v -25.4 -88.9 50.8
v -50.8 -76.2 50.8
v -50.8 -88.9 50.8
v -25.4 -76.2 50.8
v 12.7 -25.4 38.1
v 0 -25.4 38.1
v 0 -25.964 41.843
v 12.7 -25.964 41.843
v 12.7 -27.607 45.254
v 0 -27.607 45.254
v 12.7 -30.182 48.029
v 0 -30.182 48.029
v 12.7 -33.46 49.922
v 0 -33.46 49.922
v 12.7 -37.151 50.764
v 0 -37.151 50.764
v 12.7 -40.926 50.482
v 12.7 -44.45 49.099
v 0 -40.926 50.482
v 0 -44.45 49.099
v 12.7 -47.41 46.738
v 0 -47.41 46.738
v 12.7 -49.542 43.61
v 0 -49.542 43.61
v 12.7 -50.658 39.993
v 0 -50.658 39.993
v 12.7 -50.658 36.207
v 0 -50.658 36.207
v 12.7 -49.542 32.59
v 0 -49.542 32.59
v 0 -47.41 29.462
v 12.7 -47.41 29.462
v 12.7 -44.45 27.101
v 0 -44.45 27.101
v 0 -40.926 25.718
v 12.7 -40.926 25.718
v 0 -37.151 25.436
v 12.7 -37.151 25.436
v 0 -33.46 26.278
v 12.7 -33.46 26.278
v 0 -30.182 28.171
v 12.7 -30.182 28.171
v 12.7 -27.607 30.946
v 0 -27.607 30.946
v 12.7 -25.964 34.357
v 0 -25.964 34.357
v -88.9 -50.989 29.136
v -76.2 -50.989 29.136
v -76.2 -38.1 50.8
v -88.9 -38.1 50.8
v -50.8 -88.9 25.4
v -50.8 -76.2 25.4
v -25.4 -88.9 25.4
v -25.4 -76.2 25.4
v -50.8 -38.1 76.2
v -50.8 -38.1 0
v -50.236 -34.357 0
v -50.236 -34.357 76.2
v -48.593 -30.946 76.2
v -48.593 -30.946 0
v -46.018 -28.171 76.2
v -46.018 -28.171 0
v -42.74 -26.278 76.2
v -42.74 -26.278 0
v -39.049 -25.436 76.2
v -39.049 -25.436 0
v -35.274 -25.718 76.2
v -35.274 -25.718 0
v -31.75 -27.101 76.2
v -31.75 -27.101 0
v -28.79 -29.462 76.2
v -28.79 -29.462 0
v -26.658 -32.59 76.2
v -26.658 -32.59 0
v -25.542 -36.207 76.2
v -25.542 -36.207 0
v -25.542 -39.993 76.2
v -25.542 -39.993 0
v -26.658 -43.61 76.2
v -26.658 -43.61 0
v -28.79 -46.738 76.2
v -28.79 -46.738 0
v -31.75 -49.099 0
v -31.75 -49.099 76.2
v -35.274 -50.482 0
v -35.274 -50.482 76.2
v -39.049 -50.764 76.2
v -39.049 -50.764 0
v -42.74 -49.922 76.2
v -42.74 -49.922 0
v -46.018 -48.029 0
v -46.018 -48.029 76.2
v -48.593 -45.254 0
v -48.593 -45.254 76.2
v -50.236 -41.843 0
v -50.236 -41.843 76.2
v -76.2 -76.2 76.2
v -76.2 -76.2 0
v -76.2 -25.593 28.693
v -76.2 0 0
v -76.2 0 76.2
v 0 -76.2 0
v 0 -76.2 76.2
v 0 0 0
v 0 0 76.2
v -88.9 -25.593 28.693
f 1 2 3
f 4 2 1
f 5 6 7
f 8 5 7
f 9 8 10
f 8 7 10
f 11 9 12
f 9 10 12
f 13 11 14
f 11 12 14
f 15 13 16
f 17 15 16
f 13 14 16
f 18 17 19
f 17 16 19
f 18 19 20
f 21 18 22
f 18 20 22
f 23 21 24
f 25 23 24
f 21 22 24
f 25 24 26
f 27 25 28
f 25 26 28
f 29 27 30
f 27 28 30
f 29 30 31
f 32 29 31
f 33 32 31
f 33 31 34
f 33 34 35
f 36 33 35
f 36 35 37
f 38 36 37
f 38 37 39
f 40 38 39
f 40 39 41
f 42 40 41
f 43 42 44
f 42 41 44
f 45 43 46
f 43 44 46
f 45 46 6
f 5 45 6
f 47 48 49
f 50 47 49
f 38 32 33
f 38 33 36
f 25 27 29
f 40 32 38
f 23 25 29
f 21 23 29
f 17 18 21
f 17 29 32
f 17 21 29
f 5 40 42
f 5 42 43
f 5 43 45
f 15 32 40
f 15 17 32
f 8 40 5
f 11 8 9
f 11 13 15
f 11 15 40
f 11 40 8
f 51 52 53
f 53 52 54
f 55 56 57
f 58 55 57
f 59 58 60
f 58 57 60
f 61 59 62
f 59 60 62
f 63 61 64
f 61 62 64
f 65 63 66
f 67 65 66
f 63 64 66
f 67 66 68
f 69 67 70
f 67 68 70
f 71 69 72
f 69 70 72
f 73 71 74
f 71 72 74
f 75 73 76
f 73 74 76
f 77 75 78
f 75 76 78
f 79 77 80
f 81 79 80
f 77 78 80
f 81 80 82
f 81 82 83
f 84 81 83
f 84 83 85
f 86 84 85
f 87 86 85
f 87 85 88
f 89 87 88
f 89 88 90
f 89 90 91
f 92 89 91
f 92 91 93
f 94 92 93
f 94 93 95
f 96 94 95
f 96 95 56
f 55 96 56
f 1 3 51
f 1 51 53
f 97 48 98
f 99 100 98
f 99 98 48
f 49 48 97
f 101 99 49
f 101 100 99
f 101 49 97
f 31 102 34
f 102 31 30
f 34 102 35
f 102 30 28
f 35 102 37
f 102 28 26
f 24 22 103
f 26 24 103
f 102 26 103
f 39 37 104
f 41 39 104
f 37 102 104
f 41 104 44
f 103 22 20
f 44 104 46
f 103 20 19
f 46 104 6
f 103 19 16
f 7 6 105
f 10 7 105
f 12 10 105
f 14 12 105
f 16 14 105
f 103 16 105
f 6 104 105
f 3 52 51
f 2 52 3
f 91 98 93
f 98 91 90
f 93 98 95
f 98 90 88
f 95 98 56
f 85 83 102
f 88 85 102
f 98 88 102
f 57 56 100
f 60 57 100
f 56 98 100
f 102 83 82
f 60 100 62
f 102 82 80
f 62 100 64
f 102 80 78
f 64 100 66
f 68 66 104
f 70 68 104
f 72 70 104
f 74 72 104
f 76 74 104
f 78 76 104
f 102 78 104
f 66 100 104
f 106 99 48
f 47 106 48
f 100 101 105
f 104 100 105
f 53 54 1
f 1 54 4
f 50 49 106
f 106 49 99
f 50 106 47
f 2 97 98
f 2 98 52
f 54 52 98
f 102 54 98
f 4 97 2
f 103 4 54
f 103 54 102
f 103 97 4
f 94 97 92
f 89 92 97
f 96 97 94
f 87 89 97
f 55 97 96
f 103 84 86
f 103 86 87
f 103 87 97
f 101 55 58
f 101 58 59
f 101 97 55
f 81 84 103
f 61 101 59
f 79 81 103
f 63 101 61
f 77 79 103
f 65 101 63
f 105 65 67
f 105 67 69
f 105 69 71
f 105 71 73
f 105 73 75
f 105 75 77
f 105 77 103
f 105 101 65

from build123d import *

# Parameters (mm, degrees)
F0_W      = 76.2
F0_H      = 76.2
F1_DEPTH  = 76.2
F2_W      = 25.4
F2_H      = 25.4
F3_DEPTH  = 12.7
F4_R      = 12.7
F5_DEPTH  = 12.7
F8_D      = 25.4
F10_DEPTH = 12.7


with BuildPart() as f1:
    # F0 (on Front) → F1 (new body)
    with BuildSketch(Plane.XZ):
        with Locations((-38.1, 38.1)):
            Rectangle(F0_W, F0_H)
    extrude(amount=F1_DEPTH)

    # F2 (on face) → F3 (join)
    with BuildSketch(Plane.XZ.offset(76.2)):
        with Locations((-38.1, 38.1)):
            Rectangle(F2_W, F2_H)
    extrude(amount=F3_DEPTH)

    # F4 (on face) → F5 (join)
    with BuildSketch(Plane.YZ):
        with Locations((-38.1, 38.1)):
            Circle(F4_R)
    extrude(amount=F5_DEPTH)

    # F8 (through all)
    with Locations(Plane.XY.offset(76.2)):
        with Locations((-38.1, -38.1)):
            Hole(F8_D / 2)

    # F9 (on face) → F10 (join)
    with BuildSketch(Plane(origin=(-76.2, 0, 0), x_dir=(0, -1, 0), z_dir=(-1, 0, 0))):
        Polygon((38.1, 50.8), (25.593038, 28.692628), (50.98917, 29.135919), align=None)
    extrude(amount=F10_DEPTH)


solid = f1.part
